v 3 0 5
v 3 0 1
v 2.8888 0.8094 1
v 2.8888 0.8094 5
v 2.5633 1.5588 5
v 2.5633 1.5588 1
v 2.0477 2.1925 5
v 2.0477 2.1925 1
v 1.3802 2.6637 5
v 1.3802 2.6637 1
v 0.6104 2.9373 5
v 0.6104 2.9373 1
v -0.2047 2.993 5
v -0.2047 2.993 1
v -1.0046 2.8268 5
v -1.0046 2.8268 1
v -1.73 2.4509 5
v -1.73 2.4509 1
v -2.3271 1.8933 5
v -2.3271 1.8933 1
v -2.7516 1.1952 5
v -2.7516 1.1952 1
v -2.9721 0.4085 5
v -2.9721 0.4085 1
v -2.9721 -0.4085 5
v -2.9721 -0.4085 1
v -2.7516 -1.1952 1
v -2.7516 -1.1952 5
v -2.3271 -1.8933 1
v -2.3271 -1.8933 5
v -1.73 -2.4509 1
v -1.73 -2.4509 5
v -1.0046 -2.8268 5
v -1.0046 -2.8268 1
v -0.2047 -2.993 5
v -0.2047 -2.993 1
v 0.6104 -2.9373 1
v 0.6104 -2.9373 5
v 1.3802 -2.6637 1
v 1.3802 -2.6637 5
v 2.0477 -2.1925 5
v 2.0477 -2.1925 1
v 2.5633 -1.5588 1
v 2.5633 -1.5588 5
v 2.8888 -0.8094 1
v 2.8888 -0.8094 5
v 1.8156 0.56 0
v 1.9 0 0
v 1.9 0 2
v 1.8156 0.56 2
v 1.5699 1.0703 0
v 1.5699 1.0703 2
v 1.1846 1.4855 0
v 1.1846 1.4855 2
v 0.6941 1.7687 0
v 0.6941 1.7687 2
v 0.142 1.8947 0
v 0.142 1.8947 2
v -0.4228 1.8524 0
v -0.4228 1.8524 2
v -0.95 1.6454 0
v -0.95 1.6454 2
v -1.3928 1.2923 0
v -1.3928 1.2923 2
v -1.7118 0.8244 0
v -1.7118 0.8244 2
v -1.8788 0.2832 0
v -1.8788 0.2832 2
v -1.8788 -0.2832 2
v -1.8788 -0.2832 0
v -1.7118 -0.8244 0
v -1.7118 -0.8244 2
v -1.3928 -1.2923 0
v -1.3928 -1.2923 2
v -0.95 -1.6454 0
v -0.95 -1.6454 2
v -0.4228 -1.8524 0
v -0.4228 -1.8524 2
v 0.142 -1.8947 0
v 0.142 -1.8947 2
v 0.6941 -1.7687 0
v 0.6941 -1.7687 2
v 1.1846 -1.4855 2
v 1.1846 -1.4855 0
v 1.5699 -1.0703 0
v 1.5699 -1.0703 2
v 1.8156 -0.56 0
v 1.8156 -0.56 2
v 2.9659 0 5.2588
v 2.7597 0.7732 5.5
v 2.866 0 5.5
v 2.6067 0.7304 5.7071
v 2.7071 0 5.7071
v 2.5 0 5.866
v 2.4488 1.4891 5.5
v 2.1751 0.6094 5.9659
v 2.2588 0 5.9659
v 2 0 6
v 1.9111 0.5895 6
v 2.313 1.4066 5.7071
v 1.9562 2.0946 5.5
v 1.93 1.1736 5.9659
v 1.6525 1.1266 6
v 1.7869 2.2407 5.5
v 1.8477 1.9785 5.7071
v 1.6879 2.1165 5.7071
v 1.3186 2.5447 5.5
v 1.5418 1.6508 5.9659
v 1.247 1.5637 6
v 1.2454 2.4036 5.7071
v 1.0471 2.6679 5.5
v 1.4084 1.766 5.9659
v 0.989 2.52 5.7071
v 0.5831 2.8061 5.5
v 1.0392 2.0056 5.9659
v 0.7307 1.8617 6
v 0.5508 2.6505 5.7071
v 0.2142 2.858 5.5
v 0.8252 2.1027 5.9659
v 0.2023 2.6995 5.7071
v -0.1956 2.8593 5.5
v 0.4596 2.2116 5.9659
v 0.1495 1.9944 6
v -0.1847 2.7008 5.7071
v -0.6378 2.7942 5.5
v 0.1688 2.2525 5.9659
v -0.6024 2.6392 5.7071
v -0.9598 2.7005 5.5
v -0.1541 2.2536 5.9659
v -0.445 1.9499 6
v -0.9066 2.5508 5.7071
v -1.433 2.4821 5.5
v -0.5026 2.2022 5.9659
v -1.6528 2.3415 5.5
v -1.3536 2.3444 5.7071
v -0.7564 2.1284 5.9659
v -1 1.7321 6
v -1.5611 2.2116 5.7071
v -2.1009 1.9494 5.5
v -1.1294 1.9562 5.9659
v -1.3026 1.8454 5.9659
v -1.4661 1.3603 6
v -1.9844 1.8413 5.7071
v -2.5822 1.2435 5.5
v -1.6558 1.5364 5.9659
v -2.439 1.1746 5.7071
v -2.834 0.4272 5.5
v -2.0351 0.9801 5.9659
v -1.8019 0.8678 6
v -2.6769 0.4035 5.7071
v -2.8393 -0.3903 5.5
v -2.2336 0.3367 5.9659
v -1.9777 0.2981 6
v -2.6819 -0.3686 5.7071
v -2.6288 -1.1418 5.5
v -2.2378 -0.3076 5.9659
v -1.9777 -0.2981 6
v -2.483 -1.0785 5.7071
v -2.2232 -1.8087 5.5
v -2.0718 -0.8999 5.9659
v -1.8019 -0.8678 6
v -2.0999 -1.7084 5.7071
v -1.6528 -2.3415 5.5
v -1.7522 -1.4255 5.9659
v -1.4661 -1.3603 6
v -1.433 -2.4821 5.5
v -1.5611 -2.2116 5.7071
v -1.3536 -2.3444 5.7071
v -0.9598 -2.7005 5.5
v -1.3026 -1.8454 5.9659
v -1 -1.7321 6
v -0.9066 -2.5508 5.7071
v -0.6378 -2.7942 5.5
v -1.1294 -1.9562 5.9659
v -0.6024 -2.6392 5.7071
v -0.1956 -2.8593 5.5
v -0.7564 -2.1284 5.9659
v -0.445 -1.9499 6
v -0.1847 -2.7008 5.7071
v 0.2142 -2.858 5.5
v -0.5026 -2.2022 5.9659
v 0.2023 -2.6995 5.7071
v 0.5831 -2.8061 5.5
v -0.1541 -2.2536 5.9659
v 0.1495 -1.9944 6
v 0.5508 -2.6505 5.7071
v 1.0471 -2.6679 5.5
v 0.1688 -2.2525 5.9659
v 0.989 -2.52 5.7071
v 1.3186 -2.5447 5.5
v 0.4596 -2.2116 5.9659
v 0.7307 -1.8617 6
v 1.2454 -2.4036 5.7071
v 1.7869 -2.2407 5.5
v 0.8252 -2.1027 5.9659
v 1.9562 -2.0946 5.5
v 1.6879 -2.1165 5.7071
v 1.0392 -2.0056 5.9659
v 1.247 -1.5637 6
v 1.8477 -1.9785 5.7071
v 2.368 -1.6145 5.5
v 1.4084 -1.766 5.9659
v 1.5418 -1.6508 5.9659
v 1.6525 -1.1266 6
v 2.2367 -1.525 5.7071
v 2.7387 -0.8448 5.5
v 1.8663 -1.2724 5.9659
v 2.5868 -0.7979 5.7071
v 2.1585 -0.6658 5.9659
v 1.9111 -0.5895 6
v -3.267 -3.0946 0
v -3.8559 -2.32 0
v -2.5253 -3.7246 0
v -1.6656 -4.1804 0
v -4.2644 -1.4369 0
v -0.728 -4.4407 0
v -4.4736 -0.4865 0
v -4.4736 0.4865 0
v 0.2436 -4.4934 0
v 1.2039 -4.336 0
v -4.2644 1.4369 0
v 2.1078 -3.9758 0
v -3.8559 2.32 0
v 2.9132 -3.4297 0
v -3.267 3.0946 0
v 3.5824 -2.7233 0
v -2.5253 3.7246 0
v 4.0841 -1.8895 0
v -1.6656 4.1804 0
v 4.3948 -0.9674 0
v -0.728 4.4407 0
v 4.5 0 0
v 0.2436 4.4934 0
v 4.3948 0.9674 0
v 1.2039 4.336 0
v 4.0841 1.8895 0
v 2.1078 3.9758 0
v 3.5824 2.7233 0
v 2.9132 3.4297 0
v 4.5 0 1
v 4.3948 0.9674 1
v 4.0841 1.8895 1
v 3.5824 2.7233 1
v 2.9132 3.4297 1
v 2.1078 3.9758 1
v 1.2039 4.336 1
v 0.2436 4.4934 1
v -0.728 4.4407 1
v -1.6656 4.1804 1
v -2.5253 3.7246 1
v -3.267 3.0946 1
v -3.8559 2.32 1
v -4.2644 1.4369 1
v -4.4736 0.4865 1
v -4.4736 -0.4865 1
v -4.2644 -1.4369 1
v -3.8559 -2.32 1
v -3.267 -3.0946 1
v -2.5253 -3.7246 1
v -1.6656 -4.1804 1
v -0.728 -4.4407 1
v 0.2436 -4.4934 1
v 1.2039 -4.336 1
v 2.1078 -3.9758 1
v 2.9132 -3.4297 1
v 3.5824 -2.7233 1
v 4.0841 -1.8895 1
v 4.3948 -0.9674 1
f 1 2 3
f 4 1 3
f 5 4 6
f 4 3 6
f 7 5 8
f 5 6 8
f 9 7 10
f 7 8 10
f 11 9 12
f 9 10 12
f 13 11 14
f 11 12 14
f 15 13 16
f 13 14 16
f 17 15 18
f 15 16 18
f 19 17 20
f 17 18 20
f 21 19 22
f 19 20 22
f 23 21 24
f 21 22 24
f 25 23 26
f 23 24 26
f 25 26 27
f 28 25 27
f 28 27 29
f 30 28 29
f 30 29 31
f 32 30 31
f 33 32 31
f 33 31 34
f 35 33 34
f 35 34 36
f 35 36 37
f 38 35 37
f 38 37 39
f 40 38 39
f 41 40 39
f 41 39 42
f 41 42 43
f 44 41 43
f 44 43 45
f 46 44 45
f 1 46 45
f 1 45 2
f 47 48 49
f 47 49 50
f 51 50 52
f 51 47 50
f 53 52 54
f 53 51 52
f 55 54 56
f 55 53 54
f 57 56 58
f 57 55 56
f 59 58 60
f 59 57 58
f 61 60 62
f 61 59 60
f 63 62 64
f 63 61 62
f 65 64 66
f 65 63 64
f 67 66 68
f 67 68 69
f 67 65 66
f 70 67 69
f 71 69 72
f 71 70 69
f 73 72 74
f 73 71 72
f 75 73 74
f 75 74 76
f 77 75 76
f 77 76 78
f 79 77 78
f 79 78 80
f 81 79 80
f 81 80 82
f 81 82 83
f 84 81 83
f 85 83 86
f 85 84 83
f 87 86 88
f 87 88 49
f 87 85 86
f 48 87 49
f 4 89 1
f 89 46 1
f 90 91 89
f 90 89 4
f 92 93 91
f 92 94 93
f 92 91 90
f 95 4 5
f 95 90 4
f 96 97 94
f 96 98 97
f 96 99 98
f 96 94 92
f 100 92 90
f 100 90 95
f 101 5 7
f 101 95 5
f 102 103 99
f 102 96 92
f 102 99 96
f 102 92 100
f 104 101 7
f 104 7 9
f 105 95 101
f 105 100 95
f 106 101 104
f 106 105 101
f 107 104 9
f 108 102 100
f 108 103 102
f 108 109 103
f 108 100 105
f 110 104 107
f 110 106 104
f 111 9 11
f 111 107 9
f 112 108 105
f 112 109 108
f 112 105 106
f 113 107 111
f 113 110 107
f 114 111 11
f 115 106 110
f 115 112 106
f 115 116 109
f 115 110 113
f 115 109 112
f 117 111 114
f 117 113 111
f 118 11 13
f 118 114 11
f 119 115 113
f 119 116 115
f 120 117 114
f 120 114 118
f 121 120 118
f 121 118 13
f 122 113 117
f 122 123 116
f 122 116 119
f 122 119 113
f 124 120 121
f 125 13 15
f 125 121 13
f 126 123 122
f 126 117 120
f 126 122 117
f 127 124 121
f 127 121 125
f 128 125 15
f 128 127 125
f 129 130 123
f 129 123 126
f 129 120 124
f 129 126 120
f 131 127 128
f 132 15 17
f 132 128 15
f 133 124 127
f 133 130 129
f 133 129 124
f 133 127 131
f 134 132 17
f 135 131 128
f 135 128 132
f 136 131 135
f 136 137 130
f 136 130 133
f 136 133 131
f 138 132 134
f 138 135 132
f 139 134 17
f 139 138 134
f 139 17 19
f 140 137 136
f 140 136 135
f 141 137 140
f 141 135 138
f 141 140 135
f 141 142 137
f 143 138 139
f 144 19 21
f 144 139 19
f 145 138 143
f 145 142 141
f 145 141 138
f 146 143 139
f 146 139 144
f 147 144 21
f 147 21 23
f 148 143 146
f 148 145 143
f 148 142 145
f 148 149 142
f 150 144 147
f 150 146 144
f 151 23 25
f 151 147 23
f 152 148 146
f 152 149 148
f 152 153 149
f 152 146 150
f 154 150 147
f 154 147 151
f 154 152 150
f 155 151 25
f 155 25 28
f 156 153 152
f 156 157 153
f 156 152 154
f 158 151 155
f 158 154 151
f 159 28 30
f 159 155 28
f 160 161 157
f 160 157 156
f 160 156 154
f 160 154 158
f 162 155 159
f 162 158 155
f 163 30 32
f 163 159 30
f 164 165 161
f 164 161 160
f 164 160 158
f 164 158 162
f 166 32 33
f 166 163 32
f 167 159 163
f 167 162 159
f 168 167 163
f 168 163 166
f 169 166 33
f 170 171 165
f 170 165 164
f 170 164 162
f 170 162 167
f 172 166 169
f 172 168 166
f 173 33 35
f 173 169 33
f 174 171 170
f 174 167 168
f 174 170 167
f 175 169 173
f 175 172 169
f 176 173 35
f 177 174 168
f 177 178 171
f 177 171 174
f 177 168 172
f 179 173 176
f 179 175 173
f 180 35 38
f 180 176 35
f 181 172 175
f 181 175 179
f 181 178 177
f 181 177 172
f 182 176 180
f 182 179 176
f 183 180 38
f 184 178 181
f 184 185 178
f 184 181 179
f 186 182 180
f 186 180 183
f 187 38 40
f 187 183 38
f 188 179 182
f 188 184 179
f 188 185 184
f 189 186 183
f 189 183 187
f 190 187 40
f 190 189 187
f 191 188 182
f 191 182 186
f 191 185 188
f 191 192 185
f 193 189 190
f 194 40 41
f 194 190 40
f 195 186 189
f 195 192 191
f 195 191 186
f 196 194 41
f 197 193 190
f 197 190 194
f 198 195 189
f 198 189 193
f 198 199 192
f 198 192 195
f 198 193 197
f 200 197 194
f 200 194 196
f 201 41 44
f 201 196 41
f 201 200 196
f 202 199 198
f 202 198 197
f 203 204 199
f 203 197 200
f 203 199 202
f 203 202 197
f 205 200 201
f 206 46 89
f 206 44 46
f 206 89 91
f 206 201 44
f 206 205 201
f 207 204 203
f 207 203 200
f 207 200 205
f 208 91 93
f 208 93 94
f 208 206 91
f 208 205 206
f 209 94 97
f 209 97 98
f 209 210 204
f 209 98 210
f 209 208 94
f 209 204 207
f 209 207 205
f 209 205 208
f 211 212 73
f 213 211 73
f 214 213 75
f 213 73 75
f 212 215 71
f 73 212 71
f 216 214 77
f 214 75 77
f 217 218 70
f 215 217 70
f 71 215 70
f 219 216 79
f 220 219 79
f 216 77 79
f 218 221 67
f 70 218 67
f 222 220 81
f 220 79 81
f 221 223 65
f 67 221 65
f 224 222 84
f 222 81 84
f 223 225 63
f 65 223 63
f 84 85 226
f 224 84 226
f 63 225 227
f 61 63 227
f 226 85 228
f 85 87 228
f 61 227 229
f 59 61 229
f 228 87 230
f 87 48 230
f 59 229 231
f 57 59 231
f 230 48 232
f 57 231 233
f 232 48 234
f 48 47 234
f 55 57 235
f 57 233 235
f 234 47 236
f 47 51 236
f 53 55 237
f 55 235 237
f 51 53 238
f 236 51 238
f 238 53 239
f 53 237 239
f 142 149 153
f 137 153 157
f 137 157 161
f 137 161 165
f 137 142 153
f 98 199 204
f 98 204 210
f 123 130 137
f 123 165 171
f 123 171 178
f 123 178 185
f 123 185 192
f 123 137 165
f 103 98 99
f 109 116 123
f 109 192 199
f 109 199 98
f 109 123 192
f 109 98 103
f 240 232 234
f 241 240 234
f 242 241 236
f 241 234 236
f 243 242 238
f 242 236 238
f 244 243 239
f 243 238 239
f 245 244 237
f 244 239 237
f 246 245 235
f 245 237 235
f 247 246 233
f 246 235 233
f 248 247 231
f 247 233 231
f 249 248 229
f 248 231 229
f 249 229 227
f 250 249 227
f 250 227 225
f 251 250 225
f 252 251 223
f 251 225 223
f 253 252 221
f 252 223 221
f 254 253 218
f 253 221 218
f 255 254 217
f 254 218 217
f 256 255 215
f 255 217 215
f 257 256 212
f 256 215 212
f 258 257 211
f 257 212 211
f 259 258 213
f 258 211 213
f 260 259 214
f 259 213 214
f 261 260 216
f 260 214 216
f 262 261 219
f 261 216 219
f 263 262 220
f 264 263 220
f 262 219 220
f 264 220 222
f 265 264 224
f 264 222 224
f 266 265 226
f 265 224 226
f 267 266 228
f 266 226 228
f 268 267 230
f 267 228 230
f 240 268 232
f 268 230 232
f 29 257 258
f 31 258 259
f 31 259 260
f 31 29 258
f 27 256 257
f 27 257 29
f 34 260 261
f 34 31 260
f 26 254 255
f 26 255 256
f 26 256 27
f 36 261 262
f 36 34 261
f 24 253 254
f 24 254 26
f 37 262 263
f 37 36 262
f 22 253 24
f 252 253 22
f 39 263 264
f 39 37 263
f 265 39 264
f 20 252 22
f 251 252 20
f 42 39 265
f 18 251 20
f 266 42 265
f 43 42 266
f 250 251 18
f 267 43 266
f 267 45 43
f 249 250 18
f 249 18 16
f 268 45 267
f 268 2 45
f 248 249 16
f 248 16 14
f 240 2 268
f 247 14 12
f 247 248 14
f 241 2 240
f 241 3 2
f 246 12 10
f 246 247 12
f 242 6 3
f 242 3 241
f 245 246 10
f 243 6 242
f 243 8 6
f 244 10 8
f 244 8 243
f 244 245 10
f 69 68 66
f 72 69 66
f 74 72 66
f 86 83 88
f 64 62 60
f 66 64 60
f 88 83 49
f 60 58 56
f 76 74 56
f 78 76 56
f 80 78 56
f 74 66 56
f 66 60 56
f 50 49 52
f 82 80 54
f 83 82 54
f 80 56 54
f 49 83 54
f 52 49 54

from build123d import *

# Parameters (mm, degrees)
SKETCH_1_R          = 3
EXTRUDE_1_DEPTH     = 6
SKETCH_1_4_R        = 1.9
CUT_EXTRUDE_1_DEPTH = 2
SKETCH_1_5_R        = 4.5
SKETCH_1_5_R_2      = 3
EXTRUDE_2_DEPTH     = 1
FILLET_1_R          = 1


with BuildPart() as part:
    # 草图1 → 凸台-拉伸1 (new body)
    with BuildSketch(Plane.XY):
        Circle(SKETCH_1_R)
    extrude(amount=EXTRUDE_1_DEPTH)

    # 草图1<4> → 切除-拉伸1 (cut)
    with BuildSketch(Plane.XY):
        Circle(SKETCH_1_4_R)
    extrude(amount=CUT_EXTRUDE_1_DEPTH, mode=Mode.SUBTRACT)

    # 草图1<5> → 凸台-拉伸2 (add)
    with BuildSketch(Plane.XY):
        Circle(SKETCH_1_5_R)
        Circle(SKETCH_1_5_R_2, mode=Mode.SUBTRACT)
    extrude(amount=EXTRUDE_2_DEPTH)

    # 圆角1
    fillet_1_edges = [part.edges().sort_by_distance(p)[0] for p in [
        (-3, 0, 6),
    ]]
    fillet(fillet_1_edges, radius=FILLET_1_R)


solid = part.part
